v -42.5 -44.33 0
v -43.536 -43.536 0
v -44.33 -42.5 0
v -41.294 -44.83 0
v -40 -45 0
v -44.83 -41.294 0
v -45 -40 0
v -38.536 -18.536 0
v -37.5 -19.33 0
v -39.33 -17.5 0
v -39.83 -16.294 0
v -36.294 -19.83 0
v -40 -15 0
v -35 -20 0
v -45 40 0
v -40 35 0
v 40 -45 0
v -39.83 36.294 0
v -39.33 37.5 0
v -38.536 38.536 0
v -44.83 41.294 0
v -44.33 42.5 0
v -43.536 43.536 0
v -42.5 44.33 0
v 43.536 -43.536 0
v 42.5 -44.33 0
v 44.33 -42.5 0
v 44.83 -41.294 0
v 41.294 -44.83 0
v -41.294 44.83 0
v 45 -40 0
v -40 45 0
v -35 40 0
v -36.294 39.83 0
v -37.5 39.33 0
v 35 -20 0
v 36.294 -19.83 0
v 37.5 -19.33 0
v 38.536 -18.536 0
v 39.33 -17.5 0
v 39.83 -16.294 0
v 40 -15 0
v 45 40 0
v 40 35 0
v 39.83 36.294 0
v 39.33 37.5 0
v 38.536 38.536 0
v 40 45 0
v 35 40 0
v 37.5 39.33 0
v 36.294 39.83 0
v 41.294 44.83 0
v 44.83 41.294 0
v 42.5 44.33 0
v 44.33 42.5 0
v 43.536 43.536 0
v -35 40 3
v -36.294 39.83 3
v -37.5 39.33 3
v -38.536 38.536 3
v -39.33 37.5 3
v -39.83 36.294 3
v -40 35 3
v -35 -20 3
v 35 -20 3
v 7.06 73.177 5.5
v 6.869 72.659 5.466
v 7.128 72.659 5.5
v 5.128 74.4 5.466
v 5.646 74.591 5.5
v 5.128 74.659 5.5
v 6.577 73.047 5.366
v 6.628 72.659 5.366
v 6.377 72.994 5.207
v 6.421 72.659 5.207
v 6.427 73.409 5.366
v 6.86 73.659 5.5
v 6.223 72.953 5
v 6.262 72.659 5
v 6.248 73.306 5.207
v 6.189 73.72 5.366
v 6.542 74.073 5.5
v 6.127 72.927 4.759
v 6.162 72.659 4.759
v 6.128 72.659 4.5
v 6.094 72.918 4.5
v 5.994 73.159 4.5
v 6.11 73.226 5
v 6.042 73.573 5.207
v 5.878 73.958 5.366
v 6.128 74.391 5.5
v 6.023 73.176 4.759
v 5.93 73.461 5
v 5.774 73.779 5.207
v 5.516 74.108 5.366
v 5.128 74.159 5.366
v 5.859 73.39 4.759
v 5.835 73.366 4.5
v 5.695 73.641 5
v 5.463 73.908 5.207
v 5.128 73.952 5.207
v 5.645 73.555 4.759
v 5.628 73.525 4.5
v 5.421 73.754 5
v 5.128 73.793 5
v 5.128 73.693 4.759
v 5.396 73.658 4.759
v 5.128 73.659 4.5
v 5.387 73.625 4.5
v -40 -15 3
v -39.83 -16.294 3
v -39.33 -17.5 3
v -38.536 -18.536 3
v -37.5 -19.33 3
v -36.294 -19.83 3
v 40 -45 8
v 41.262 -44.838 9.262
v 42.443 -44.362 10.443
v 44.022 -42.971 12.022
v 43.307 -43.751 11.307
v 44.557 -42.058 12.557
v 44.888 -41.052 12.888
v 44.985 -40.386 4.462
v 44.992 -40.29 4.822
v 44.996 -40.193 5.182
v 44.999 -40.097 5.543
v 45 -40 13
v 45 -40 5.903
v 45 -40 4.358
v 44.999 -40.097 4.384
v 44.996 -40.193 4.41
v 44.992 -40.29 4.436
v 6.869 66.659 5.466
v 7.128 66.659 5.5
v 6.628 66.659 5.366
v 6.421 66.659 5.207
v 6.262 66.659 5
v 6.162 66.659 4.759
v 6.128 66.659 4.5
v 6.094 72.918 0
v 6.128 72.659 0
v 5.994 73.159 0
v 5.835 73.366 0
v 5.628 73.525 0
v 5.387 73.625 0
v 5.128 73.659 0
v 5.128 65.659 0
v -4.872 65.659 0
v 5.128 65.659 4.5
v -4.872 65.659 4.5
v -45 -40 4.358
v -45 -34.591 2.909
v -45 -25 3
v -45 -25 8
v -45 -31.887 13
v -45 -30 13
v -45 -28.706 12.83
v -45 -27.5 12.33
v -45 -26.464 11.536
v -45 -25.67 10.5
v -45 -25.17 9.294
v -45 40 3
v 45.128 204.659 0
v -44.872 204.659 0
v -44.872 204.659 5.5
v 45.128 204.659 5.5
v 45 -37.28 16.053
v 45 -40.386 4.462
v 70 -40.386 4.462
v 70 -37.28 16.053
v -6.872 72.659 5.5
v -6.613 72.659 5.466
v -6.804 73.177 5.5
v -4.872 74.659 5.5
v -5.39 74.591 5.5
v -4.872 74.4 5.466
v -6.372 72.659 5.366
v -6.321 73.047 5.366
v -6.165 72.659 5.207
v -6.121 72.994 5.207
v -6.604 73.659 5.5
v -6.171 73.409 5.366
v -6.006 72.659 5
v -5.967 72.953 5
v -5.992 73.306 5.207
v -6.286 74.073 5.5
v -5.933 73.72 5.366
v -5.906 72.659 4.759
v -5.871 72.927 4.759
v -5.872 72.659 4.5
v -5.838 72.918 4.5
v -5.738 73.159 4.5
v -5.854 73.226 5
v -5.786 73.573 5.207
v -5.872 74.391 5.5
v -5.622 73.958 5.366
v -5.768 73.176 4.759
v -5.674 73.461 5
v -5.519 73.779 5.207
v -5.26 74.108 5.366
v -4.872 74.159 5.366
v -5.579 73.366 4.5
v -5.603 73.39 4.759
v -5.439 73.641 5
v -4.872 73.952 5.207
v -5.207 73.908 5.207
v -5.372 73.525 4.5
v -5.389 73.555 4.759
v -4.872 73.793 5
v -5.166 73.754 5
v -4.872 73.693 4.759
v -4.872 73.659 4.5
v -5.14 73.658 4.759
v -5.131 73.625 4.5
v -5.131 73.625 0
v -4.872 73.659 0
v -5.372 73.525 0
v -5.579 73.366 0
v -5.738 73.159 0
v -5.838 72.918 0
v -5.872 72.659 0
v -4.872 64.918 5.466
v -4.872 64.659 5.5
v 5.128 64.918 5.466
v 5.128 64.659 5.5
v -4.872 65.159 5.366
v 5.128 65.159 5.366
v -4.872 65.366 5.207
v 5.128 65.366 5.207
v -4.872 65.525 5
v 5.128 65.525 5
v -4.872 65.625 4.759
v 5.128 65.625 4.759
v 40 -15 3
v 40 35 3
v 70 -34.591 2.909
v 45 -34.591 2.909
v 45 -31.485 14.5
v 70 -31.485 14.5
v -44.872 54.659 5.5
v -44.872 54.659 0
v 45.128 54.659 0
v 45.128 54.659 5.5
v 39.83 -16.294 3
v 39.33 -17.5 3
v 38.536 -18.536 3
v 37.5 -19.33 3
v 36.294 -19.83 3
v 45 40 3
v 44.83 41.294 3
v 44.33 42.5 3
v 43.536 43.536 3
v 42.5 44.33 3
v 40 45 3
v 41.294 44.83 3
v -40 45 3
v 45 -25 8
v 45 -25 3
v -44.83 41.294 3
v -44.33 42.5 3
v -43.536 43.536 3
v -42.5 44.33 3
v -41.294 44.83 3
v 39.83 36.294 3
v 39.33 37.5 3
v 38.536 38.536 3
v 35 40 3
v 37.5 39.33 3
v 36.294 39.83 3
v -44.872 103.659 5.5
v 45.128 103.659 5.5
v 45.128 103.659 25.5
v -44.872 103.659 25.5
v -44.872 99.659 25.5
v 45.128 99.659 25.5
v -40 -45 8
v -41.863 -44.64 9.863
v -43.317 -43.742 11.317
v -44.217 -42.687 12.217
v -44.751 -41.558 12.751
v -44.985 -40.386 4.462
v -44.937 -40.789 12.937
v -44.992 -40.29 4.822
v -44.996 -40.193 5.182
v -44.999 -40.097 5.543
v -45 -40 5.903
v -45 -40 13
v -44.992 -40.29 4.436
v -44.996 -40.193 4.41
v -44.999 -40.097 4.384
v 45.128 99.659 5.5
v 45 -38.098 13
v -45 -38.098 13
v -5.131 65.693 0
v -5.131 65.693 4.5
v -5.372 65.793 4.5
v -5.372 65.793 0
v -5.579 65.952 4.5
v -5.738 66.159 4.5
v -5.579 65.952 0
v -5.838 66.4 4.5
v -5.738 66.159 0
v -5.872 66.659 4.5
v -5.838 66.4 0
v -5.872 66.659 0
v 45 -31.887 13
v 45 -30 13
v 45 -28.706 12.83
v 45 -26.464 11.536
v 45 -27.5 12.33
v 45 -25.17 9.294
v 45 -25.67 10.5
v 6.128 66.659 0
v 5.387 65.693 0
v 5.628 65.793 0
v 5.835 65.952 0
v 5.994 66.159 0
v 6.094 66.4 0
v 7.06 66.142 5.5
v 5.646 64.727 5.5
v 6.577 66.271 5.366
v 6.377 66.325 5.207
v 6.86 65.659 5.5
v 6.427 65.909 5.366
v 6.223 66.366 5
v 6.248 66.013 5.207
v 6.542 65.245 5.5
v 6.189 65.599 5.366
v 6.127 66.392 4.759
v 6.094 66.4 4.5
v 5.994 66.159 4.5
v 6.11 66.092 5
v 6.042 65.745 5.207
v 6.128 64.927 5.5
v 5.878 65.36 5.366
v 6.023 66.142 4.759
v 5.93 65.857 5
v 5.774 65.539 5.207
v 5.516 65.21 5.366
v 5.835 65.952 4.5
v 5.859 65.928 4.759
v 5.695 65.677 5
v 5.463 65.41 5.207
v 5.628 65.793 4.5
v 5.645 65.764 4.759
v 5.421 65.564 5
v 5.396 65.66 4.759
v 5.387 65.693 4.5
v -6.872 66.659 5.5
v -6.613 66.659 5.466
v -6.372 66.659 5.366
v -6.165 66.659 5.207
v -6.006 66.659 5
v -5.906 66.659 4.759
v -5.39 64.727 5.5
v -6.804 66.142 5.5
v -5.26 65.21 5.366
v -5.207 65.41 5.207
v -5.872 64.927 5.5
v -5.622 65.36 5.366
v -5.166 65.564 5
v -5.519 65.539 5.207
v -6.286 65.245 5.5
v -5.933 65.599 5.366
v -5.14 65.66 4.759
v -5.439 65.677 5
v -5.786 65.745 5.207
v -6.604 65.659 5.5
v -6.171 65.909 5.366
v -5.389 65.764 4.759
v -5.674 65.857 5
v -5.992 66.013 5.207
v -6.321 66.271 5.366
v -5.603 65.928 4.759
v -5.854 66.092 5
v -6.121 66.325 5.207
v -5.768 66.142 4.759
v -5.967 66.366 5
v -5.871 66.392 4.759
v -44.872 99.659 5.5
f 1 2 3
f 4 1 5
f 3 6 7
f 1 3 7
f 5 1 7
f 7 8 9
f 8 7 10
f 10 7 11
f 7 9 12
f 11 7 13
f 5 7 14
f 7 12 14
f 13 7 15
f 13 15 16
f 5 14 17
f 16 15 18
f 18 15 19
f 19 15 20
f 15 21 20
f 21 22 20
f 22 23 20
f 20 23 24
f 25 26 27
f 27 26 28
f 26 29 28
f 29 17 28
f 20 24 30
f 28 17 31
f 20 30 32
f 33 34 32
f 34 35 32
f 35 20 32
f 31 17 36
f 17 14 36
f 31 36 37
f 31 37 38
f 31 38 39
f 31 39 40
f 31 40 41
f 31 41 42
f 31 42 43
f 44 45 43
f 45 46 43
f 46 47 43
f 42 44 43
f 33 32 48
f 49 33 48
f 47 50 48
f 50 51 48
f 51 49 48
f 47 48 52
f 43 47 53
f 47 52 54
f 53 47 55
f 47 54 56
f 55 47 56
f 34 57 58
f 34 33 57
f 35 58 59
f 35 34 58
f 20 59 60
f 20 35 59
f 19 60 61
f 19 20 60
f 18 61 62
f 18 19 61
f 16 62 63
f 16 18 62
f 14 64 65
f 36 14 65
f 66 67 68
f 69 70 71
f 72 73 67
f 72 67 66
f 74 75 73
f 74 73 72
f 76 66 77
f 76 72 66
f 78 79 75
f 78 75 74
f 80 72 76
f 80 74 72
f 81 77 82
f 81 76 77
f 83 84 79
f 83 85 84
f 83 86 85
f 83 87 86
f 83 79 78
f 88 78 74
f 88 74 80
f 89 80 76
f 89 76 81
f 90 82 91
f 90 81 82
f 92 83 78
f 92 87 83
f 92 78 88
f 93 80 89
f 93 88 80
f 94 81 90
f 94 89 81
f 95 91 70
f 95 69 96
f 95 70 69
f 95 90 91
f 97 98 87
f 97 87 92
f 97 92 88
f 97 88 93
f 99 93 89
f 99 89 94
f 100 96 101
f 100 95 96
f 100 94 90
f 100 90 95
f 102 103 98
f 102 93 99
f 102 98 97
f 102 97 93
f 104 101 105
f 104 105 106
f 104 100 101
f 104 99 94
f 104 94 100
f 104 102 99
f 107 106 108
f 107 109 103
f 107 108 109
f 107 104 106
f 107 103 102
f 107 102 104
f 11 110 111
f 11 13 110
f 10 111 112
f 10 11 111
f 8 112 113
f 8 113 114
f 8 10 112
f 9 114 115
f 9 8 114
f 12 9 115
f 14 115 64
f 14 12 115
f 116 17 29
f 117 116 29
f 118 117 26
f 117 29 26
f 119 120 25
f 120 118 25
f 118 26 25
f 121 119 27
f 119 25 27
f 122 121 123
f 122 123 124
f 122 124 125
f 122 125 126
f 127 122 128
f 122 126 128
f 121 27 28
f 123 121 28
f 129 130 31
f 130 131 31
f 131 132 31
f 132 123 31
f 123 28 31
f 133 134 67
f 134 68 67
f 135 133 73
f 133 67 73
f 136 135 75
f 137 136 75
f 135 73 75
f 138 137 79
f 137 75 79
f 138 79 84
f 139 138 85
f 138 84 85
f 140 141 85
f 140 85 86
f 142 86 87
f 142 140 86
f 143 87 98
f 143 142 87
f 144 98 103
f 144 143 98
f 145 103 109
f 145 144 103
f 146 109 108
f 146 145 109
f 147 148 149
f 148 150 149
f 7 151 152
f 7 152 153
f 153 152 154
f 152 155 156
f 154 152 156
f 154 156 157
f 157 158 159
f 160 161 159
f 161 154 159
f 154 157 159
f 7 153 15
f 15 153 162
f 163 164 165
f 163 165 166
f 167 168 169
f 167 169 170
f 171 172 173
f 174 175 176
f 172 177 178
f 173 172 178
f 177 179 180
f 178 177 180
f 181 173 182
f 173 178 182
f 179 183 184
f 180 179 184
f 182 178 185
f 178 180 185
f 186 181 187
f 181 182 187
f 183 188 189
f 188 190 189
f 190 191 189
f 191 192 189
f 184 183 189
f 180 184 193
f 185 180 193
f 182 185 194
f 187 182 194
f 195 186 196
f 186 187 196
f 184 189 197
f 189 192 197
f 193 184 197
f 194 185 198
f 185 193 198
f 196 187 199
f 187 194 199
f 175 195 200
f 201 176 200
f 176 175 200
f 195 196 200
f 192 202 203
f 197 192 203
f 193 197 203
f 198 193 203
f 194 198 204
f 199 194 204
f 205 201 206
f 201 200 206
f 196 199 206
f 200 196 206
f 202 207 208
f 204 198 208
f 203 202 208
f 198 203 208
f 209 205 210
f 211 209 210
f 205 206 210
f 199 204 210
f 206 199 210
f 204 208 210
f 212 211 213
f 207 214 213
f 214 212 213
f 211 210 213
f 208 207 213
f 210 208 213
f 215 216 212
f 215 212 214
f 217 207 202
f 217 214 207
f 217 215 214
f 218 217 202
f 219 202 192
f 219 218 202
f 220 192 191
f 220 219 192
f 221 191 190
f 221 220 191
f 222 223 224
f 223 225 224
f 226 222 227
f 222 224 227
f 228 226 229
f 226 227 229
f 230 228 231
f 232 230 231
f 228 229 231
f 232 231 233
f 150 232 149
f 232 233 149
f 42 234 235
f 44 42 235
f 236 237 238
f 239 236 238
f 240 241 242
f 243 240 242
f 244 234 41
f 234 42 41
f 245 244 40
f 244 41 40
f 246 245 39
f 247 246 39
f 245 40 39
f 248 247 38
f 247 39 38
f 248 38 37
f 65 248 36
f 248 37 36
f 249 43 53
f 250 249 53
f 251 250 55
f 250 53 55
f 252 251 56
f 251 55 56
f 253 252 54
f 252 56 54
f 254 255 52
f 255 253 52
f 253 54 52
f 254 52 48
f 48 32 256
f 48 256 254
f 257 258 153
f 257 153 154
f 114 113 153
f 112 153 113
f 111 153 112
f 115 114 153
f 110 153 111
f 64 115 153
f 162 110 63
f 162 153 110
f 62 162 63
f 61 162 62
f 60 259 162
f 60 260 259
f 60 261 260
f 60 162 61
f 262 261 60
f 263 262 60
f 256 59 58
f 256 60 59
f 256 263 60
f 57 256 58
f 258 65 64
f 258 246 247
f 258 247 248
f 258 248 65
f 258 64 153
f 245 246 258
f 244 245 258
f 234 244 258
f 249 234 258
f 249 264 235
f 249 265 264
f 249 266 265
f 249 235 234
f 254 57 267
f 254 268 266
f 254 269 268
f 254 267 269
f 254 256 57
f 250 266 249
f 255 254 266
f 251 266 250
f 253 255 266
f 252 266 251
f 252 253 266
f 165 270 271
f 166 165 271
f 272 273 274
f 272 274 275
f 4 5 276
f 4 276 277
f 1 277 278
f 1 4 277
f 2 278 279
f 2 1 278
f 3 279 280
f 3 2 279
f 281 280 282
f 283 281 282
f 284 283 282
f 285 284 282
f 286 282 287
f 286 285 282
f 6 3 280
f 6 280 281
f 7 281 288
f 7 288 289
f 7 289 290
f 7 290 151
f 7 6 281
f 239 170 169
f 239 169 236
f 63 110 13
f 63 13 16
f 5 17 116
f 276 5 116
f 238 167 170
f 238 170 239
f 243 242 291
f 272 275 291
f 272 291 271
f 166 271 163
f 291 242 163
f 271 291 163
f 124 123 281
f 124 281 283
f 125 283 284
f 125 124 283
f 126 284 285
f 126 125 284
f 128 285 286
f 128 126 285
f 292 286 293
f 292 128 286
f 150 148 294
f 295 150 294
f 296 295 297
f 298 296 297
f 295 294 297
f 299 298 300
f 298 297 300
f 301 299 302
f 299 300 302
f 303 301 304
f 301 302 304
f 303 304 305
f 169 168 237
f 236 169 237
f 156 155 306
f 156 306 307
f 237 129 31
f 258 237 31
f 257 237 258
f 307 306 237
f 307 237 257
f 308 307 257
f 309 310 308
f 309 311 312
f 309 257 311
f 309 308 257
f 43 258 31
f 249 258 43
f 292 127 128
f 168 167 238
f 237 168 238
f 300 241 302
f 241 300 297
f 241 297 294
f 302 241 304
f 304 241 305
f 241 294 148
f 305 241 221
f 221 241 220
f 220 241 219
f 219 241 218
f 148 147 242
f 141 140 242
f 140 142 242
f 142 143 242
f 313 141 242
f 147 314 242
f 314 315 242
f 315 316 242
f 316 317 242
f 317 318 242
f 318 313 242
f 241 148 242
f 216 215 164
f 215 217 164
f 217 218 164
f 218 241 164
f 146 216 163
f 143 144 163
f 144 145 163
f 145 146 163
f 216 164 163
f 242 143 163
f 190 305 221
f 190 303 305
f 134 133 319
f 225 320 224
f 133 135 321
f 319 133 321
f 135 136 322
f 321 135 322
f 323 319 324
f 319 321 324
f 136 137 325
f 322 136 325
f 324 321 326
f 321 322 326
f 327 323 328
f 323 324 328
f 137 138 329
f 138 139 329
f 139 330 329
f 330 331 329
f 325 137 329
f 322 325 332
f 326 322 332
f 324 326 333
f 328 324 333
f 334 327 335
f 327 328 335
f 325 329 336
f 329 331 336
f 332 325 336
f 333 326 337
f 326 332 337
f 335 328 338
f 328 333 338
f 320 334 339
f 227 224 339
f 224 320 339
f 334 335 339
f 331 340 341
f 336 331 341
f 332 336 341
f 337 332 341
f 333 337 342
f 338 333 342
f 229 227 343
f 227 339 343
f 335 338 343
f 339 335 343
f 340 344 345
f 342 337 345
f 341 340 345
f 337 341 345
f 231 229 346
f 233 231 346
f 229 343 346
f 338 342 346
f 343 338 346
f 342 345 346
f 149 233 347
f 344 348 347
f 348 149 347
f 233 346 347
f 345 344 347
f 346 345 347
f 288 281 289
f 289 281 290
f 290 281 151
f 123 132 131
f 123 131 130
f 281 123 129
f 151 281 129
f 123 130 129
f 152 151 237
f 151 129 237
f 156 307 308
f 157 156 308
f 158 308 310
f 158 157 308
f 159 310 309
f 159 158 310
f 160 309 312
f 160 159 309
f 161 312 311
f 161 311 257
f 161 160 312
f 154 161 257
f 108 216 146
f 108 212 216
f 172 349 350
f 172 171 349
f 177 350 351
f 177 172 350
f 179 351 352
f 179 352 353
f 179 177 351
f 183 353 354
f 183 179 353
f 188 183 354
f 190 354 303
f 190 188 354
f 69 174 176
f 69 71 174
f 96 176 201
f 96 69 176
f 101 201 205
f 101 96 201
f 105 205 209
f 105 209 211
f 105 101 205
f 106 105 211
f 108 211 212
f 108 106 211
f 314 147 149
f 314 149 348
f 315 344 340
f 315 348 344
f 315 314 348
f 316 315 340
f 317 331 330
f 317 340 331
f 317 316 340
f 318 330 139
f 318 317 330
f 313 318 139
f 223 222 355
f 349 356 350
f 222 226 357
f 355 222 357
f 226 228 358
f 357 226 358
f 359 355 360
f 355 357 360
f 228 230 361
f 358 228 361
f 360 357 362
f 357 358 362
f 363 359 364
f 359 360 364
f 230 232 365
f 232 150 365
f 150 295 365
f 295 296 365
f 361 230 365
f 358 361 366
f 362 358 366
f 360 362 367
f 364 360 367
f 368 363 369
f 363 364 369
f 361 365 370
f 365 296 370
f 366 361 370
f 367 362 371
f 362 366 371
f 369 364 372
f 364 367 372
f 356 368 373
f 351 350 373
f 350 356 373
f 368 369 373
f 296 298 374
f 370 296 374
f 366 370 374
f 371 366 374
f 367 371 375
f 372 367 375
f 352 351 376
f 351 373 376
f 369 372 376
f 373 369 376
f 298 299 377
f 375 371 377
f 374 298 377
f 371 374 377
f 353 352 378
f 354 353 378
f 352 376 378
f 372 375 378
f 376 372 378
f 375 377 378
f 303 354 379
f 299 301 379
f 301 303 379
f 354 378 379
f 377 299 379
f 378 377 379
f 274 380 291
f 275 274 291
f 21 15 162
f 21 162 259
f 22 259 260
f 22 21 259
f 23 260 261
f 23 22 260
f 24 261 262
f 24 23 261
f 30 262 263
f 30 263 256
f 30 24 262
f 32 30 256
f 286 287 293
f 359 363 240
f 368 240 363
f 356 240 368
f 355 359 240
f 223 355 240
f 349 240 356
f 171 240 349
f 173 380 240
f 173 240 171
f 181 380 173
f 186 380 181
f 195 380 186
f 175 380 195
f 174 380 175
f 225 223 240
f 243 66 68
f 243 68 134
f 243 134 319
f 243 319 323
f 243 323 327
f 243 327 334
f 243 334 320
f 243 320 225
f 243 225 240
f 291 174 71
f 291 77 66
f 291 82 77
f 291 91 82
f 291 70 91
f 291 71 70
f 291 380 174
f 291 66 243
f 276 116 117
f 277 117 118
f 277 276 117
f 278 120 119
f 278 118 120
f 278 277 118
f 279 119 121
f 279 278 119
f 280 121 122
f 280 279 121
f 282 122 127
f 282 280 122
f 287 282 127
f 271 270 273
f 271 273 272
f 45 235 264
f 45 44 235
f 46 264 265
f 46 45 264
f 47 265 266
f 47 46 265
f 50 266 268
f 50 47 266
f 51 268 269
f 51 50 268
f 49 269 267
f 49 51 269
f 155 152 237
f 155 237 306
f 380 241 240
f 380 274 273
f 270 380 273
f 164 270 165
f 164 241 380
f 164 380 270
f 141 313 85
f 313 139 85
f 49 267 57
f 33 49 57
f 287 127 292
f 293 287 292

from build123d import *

# Parameters (mm, degrees)
F0_W        = 90
F0_H        = 90
F1_DEPTH    = 3
F2_W        = 20
F2_H        = 10
F3_DEPTH    = 90
F4_W        = 6
F4_H        = 12
F5_DEPTH    = 25
F6_ANGLE    = 15
F8_DEPTH    = 200
F9_T1_DEPTH = 28
F9_T3_DEPTH = 38
F9_T5_DEPTH = 115
F10_W       = 40
F10_H       = 60
F11_DEPTH   = 25
F12_R       = 5
F13_W       = 90
F13_H       = 150
F14_DEPTH   = 5.5
F15_W       = 90
F15_H       = 4
F16_DEPTH   = 20
F17_W       = 12
F17_H       = 8
F18_DEPTH   = 25
F19_R       = 1


# Not quite as in the source:
# - a fillet or chamfer that OpenCascade refuses, or shapes differently, is made with other operations: its cross-section is extruded or revolved along the edge and cut away or added
# - a pattern or mirror of a feature is missing from the dataset's text; its kind, count and spacing are read off the source's solid
# - a feature names something its author has since deleted; it is built from what else it names


with BuildPart() as f1:
    # F0 (on Top) → F1 (new body)
    with BuildSketch(Plane.XY):
        Rectangle(F0_W, F0_H)
    extrude(amount=F1_DEPTH)

    # F2 (on face) → F3 (join, through all)
    with BuildSketch(Plane.YZ.offset(45)):
        with Locations((-35, 8)):
            Rectangle(F2_W, F2_H)
    extrude(amount=-F3_DEPTH)



with BuildPart() as f5:
    # F4 (on face) → F5 (new body)
    with BuildSketch(Plane.YZ.offset(45)):
        with Locations((-35.6848337948, 7)):
            Rectangle(F4_W, F4_H)
    extrude(amount=F5_DEPTH)


with BuildPart() as f5_1:
    # F6: moved
    add(f5.part.rotate(Axis((57.5, -32.6848337948, 13), (-1, 0, 0)), F6_ANGLE))


with BuildPart() as f5_2:
    # F7: moved
    add(f5_1.part.moved(Location((0, 1.2, 1.5))))


with BuildPart() as f1_1:
    add(f1.part)
    # F8 (cut): a face of the model
    f8_faces = [f5_2.part.faces().sort_by_distance(p)[0] for p in [
        (45, -35.9355255443, 9.4809021776),
    ]]
    extrude(f8_faces, amount=F8_DEPTH, mode=Mode.SUBTRACT)

    # F9: fillet of radius 5 on 6 edges, made by hand

    # F9_s2 → F9_t1 (cut)
    with BuildSketch(Plane.XY.offset(-12.5)):
        with BuildLine():
            ThreePointArc((-45, 40), (-43.5355339059, 43.5355339059), (-40, 45))
            Line((-40, 45), (-45, 45))
            Line((-45, 45), (-45, 40))
        make_face()
        with BuildLine():
            ThreePointArc((45, 40), (43.5355339059, 43.5355339059), (40, 45))
            Line((40, 45), (45, 45))
            Line((45, 45), (45, 40))
        make_face()
    extrude(amount=F9_T1_DEPTH, mode=Mode.SUBTRACT)

    # F9_s4 → F9_t3 (cut)
    with BuildSketch(Plane.XY.offset(-12.5)):
        with BuildLine():
            ThreePointArc((-40, -45), (-43.5355339059, -43.5355339059), (-45, -40))
            Line((-45, -40), (-45, -45))
            Line((-45, -45), (-40, -45))
        make_face()
        with BuildLine():
            ThreePointArc((40, -45), (43.5355339059, -43.5355339059), (45, -40))
            Line((45, -40), (45, -45))
            Line((45, -45), (40, -45))
        make_face()
    extrude(amount=F9_T3_DEPTH, mode=Mode.SUBTRACT)

    # F9_s6 → F9_t5 (cut)
    with BuildSketch(Plane.YZ.offset(-57.5)):
        with BuildLine():
            ThreePointArc((-45, 8), (-43.5355339059, 11.5355339059), (-40, 13))
            Line((-40, 13), (-45, 13))
            Line((-45, 13), (-45, 8))
        make_face()
        with BuildLine():
            ThreePointArc((-30, 13), (-26.4644660941, 11.5355339059), (-25, 8))
            Line((-25, 8), (-25, 13))
            Line((-25, 13), (-30, 13))
        make_face()
    extrude(amount=F9_T5_DEPTH, mode=Mode.SUBTRACT)

    # F10 (on face) → F11 (cut)
    with BuildSketch(Plane.XY.offset(3)):
        with Locations((-20, 10)):
            Rectangle(F10_W, F10_H)
    f11 = extrude(amount=-F11_DEPTH, mode=Mode.SUBTRACT)

    # F11_copies: F11 across plane
    add(f11.mirror(Plane(origin=(0, 0, 0), x_dir=(0, 0, 1), z_dir=(1, 0, 0))), mode=Mode.SUBTRACT)

    # F12
    f12_edges = [f1_1.edges().sort_by_distance(p)[0] for p in [
        (-40, 40, 1.5),
        (-40, -20, 1.5),
        (40, 40, 1.5),
        (40, -20, 1.5),
    ]]
    fillet(f12_edges, radius=F12_R)


with BuildPart() as f14:
    # F13 (on Top) → F14 (new body)
    with BuildSketch(Plane.XY):
        with Locations((0.1279246807, 129.6591617167)):
            Rectangle(F13_W, F13_H)
    extrude(amount=F14_DEPTH)

    # F15 (on face) → F16 (join)
    with BuildSketch(Plane.XY.offset(5.5)):
        with Locations((0.1279246807, 101.6591617167)):
            Rectangle(F15_W, F15_H)
    extrude(amount=F16_DEPTH)

    # F17 (on face) → F18 (cut)
    with BuildSketch(Plane.XY.offset(5.5)):
        with Locations((0.1279246807, 69.6591617167)):
            Rectangle(F17_W, F17_H)
    extrude(amount=-F18_DEPTH, mode=Mode.SUBTRACT)

    # F19
    f19_edges = [f14.edges().sort_by_distance(p)[0] for p in [
        (-5.872075, 73.659162, 2.75),
        (6.127925, 73.659162, 2.75),
        (0.127925, 65.659162, 5.5),
        (-5.872075, 69.659162, 5.5),
        (6.127925, 65.659162, 2.75),
        (-5.872075, 65.659162, 2.75),
        (6.127925, 69.659162, 5.5),
        (0.127925, 73.659162, 5.5),
    ]]
    fillet(f19_edges, radius=F19_R)


solid = Compound([f5_2.part, f1_1.part, f14.part])
